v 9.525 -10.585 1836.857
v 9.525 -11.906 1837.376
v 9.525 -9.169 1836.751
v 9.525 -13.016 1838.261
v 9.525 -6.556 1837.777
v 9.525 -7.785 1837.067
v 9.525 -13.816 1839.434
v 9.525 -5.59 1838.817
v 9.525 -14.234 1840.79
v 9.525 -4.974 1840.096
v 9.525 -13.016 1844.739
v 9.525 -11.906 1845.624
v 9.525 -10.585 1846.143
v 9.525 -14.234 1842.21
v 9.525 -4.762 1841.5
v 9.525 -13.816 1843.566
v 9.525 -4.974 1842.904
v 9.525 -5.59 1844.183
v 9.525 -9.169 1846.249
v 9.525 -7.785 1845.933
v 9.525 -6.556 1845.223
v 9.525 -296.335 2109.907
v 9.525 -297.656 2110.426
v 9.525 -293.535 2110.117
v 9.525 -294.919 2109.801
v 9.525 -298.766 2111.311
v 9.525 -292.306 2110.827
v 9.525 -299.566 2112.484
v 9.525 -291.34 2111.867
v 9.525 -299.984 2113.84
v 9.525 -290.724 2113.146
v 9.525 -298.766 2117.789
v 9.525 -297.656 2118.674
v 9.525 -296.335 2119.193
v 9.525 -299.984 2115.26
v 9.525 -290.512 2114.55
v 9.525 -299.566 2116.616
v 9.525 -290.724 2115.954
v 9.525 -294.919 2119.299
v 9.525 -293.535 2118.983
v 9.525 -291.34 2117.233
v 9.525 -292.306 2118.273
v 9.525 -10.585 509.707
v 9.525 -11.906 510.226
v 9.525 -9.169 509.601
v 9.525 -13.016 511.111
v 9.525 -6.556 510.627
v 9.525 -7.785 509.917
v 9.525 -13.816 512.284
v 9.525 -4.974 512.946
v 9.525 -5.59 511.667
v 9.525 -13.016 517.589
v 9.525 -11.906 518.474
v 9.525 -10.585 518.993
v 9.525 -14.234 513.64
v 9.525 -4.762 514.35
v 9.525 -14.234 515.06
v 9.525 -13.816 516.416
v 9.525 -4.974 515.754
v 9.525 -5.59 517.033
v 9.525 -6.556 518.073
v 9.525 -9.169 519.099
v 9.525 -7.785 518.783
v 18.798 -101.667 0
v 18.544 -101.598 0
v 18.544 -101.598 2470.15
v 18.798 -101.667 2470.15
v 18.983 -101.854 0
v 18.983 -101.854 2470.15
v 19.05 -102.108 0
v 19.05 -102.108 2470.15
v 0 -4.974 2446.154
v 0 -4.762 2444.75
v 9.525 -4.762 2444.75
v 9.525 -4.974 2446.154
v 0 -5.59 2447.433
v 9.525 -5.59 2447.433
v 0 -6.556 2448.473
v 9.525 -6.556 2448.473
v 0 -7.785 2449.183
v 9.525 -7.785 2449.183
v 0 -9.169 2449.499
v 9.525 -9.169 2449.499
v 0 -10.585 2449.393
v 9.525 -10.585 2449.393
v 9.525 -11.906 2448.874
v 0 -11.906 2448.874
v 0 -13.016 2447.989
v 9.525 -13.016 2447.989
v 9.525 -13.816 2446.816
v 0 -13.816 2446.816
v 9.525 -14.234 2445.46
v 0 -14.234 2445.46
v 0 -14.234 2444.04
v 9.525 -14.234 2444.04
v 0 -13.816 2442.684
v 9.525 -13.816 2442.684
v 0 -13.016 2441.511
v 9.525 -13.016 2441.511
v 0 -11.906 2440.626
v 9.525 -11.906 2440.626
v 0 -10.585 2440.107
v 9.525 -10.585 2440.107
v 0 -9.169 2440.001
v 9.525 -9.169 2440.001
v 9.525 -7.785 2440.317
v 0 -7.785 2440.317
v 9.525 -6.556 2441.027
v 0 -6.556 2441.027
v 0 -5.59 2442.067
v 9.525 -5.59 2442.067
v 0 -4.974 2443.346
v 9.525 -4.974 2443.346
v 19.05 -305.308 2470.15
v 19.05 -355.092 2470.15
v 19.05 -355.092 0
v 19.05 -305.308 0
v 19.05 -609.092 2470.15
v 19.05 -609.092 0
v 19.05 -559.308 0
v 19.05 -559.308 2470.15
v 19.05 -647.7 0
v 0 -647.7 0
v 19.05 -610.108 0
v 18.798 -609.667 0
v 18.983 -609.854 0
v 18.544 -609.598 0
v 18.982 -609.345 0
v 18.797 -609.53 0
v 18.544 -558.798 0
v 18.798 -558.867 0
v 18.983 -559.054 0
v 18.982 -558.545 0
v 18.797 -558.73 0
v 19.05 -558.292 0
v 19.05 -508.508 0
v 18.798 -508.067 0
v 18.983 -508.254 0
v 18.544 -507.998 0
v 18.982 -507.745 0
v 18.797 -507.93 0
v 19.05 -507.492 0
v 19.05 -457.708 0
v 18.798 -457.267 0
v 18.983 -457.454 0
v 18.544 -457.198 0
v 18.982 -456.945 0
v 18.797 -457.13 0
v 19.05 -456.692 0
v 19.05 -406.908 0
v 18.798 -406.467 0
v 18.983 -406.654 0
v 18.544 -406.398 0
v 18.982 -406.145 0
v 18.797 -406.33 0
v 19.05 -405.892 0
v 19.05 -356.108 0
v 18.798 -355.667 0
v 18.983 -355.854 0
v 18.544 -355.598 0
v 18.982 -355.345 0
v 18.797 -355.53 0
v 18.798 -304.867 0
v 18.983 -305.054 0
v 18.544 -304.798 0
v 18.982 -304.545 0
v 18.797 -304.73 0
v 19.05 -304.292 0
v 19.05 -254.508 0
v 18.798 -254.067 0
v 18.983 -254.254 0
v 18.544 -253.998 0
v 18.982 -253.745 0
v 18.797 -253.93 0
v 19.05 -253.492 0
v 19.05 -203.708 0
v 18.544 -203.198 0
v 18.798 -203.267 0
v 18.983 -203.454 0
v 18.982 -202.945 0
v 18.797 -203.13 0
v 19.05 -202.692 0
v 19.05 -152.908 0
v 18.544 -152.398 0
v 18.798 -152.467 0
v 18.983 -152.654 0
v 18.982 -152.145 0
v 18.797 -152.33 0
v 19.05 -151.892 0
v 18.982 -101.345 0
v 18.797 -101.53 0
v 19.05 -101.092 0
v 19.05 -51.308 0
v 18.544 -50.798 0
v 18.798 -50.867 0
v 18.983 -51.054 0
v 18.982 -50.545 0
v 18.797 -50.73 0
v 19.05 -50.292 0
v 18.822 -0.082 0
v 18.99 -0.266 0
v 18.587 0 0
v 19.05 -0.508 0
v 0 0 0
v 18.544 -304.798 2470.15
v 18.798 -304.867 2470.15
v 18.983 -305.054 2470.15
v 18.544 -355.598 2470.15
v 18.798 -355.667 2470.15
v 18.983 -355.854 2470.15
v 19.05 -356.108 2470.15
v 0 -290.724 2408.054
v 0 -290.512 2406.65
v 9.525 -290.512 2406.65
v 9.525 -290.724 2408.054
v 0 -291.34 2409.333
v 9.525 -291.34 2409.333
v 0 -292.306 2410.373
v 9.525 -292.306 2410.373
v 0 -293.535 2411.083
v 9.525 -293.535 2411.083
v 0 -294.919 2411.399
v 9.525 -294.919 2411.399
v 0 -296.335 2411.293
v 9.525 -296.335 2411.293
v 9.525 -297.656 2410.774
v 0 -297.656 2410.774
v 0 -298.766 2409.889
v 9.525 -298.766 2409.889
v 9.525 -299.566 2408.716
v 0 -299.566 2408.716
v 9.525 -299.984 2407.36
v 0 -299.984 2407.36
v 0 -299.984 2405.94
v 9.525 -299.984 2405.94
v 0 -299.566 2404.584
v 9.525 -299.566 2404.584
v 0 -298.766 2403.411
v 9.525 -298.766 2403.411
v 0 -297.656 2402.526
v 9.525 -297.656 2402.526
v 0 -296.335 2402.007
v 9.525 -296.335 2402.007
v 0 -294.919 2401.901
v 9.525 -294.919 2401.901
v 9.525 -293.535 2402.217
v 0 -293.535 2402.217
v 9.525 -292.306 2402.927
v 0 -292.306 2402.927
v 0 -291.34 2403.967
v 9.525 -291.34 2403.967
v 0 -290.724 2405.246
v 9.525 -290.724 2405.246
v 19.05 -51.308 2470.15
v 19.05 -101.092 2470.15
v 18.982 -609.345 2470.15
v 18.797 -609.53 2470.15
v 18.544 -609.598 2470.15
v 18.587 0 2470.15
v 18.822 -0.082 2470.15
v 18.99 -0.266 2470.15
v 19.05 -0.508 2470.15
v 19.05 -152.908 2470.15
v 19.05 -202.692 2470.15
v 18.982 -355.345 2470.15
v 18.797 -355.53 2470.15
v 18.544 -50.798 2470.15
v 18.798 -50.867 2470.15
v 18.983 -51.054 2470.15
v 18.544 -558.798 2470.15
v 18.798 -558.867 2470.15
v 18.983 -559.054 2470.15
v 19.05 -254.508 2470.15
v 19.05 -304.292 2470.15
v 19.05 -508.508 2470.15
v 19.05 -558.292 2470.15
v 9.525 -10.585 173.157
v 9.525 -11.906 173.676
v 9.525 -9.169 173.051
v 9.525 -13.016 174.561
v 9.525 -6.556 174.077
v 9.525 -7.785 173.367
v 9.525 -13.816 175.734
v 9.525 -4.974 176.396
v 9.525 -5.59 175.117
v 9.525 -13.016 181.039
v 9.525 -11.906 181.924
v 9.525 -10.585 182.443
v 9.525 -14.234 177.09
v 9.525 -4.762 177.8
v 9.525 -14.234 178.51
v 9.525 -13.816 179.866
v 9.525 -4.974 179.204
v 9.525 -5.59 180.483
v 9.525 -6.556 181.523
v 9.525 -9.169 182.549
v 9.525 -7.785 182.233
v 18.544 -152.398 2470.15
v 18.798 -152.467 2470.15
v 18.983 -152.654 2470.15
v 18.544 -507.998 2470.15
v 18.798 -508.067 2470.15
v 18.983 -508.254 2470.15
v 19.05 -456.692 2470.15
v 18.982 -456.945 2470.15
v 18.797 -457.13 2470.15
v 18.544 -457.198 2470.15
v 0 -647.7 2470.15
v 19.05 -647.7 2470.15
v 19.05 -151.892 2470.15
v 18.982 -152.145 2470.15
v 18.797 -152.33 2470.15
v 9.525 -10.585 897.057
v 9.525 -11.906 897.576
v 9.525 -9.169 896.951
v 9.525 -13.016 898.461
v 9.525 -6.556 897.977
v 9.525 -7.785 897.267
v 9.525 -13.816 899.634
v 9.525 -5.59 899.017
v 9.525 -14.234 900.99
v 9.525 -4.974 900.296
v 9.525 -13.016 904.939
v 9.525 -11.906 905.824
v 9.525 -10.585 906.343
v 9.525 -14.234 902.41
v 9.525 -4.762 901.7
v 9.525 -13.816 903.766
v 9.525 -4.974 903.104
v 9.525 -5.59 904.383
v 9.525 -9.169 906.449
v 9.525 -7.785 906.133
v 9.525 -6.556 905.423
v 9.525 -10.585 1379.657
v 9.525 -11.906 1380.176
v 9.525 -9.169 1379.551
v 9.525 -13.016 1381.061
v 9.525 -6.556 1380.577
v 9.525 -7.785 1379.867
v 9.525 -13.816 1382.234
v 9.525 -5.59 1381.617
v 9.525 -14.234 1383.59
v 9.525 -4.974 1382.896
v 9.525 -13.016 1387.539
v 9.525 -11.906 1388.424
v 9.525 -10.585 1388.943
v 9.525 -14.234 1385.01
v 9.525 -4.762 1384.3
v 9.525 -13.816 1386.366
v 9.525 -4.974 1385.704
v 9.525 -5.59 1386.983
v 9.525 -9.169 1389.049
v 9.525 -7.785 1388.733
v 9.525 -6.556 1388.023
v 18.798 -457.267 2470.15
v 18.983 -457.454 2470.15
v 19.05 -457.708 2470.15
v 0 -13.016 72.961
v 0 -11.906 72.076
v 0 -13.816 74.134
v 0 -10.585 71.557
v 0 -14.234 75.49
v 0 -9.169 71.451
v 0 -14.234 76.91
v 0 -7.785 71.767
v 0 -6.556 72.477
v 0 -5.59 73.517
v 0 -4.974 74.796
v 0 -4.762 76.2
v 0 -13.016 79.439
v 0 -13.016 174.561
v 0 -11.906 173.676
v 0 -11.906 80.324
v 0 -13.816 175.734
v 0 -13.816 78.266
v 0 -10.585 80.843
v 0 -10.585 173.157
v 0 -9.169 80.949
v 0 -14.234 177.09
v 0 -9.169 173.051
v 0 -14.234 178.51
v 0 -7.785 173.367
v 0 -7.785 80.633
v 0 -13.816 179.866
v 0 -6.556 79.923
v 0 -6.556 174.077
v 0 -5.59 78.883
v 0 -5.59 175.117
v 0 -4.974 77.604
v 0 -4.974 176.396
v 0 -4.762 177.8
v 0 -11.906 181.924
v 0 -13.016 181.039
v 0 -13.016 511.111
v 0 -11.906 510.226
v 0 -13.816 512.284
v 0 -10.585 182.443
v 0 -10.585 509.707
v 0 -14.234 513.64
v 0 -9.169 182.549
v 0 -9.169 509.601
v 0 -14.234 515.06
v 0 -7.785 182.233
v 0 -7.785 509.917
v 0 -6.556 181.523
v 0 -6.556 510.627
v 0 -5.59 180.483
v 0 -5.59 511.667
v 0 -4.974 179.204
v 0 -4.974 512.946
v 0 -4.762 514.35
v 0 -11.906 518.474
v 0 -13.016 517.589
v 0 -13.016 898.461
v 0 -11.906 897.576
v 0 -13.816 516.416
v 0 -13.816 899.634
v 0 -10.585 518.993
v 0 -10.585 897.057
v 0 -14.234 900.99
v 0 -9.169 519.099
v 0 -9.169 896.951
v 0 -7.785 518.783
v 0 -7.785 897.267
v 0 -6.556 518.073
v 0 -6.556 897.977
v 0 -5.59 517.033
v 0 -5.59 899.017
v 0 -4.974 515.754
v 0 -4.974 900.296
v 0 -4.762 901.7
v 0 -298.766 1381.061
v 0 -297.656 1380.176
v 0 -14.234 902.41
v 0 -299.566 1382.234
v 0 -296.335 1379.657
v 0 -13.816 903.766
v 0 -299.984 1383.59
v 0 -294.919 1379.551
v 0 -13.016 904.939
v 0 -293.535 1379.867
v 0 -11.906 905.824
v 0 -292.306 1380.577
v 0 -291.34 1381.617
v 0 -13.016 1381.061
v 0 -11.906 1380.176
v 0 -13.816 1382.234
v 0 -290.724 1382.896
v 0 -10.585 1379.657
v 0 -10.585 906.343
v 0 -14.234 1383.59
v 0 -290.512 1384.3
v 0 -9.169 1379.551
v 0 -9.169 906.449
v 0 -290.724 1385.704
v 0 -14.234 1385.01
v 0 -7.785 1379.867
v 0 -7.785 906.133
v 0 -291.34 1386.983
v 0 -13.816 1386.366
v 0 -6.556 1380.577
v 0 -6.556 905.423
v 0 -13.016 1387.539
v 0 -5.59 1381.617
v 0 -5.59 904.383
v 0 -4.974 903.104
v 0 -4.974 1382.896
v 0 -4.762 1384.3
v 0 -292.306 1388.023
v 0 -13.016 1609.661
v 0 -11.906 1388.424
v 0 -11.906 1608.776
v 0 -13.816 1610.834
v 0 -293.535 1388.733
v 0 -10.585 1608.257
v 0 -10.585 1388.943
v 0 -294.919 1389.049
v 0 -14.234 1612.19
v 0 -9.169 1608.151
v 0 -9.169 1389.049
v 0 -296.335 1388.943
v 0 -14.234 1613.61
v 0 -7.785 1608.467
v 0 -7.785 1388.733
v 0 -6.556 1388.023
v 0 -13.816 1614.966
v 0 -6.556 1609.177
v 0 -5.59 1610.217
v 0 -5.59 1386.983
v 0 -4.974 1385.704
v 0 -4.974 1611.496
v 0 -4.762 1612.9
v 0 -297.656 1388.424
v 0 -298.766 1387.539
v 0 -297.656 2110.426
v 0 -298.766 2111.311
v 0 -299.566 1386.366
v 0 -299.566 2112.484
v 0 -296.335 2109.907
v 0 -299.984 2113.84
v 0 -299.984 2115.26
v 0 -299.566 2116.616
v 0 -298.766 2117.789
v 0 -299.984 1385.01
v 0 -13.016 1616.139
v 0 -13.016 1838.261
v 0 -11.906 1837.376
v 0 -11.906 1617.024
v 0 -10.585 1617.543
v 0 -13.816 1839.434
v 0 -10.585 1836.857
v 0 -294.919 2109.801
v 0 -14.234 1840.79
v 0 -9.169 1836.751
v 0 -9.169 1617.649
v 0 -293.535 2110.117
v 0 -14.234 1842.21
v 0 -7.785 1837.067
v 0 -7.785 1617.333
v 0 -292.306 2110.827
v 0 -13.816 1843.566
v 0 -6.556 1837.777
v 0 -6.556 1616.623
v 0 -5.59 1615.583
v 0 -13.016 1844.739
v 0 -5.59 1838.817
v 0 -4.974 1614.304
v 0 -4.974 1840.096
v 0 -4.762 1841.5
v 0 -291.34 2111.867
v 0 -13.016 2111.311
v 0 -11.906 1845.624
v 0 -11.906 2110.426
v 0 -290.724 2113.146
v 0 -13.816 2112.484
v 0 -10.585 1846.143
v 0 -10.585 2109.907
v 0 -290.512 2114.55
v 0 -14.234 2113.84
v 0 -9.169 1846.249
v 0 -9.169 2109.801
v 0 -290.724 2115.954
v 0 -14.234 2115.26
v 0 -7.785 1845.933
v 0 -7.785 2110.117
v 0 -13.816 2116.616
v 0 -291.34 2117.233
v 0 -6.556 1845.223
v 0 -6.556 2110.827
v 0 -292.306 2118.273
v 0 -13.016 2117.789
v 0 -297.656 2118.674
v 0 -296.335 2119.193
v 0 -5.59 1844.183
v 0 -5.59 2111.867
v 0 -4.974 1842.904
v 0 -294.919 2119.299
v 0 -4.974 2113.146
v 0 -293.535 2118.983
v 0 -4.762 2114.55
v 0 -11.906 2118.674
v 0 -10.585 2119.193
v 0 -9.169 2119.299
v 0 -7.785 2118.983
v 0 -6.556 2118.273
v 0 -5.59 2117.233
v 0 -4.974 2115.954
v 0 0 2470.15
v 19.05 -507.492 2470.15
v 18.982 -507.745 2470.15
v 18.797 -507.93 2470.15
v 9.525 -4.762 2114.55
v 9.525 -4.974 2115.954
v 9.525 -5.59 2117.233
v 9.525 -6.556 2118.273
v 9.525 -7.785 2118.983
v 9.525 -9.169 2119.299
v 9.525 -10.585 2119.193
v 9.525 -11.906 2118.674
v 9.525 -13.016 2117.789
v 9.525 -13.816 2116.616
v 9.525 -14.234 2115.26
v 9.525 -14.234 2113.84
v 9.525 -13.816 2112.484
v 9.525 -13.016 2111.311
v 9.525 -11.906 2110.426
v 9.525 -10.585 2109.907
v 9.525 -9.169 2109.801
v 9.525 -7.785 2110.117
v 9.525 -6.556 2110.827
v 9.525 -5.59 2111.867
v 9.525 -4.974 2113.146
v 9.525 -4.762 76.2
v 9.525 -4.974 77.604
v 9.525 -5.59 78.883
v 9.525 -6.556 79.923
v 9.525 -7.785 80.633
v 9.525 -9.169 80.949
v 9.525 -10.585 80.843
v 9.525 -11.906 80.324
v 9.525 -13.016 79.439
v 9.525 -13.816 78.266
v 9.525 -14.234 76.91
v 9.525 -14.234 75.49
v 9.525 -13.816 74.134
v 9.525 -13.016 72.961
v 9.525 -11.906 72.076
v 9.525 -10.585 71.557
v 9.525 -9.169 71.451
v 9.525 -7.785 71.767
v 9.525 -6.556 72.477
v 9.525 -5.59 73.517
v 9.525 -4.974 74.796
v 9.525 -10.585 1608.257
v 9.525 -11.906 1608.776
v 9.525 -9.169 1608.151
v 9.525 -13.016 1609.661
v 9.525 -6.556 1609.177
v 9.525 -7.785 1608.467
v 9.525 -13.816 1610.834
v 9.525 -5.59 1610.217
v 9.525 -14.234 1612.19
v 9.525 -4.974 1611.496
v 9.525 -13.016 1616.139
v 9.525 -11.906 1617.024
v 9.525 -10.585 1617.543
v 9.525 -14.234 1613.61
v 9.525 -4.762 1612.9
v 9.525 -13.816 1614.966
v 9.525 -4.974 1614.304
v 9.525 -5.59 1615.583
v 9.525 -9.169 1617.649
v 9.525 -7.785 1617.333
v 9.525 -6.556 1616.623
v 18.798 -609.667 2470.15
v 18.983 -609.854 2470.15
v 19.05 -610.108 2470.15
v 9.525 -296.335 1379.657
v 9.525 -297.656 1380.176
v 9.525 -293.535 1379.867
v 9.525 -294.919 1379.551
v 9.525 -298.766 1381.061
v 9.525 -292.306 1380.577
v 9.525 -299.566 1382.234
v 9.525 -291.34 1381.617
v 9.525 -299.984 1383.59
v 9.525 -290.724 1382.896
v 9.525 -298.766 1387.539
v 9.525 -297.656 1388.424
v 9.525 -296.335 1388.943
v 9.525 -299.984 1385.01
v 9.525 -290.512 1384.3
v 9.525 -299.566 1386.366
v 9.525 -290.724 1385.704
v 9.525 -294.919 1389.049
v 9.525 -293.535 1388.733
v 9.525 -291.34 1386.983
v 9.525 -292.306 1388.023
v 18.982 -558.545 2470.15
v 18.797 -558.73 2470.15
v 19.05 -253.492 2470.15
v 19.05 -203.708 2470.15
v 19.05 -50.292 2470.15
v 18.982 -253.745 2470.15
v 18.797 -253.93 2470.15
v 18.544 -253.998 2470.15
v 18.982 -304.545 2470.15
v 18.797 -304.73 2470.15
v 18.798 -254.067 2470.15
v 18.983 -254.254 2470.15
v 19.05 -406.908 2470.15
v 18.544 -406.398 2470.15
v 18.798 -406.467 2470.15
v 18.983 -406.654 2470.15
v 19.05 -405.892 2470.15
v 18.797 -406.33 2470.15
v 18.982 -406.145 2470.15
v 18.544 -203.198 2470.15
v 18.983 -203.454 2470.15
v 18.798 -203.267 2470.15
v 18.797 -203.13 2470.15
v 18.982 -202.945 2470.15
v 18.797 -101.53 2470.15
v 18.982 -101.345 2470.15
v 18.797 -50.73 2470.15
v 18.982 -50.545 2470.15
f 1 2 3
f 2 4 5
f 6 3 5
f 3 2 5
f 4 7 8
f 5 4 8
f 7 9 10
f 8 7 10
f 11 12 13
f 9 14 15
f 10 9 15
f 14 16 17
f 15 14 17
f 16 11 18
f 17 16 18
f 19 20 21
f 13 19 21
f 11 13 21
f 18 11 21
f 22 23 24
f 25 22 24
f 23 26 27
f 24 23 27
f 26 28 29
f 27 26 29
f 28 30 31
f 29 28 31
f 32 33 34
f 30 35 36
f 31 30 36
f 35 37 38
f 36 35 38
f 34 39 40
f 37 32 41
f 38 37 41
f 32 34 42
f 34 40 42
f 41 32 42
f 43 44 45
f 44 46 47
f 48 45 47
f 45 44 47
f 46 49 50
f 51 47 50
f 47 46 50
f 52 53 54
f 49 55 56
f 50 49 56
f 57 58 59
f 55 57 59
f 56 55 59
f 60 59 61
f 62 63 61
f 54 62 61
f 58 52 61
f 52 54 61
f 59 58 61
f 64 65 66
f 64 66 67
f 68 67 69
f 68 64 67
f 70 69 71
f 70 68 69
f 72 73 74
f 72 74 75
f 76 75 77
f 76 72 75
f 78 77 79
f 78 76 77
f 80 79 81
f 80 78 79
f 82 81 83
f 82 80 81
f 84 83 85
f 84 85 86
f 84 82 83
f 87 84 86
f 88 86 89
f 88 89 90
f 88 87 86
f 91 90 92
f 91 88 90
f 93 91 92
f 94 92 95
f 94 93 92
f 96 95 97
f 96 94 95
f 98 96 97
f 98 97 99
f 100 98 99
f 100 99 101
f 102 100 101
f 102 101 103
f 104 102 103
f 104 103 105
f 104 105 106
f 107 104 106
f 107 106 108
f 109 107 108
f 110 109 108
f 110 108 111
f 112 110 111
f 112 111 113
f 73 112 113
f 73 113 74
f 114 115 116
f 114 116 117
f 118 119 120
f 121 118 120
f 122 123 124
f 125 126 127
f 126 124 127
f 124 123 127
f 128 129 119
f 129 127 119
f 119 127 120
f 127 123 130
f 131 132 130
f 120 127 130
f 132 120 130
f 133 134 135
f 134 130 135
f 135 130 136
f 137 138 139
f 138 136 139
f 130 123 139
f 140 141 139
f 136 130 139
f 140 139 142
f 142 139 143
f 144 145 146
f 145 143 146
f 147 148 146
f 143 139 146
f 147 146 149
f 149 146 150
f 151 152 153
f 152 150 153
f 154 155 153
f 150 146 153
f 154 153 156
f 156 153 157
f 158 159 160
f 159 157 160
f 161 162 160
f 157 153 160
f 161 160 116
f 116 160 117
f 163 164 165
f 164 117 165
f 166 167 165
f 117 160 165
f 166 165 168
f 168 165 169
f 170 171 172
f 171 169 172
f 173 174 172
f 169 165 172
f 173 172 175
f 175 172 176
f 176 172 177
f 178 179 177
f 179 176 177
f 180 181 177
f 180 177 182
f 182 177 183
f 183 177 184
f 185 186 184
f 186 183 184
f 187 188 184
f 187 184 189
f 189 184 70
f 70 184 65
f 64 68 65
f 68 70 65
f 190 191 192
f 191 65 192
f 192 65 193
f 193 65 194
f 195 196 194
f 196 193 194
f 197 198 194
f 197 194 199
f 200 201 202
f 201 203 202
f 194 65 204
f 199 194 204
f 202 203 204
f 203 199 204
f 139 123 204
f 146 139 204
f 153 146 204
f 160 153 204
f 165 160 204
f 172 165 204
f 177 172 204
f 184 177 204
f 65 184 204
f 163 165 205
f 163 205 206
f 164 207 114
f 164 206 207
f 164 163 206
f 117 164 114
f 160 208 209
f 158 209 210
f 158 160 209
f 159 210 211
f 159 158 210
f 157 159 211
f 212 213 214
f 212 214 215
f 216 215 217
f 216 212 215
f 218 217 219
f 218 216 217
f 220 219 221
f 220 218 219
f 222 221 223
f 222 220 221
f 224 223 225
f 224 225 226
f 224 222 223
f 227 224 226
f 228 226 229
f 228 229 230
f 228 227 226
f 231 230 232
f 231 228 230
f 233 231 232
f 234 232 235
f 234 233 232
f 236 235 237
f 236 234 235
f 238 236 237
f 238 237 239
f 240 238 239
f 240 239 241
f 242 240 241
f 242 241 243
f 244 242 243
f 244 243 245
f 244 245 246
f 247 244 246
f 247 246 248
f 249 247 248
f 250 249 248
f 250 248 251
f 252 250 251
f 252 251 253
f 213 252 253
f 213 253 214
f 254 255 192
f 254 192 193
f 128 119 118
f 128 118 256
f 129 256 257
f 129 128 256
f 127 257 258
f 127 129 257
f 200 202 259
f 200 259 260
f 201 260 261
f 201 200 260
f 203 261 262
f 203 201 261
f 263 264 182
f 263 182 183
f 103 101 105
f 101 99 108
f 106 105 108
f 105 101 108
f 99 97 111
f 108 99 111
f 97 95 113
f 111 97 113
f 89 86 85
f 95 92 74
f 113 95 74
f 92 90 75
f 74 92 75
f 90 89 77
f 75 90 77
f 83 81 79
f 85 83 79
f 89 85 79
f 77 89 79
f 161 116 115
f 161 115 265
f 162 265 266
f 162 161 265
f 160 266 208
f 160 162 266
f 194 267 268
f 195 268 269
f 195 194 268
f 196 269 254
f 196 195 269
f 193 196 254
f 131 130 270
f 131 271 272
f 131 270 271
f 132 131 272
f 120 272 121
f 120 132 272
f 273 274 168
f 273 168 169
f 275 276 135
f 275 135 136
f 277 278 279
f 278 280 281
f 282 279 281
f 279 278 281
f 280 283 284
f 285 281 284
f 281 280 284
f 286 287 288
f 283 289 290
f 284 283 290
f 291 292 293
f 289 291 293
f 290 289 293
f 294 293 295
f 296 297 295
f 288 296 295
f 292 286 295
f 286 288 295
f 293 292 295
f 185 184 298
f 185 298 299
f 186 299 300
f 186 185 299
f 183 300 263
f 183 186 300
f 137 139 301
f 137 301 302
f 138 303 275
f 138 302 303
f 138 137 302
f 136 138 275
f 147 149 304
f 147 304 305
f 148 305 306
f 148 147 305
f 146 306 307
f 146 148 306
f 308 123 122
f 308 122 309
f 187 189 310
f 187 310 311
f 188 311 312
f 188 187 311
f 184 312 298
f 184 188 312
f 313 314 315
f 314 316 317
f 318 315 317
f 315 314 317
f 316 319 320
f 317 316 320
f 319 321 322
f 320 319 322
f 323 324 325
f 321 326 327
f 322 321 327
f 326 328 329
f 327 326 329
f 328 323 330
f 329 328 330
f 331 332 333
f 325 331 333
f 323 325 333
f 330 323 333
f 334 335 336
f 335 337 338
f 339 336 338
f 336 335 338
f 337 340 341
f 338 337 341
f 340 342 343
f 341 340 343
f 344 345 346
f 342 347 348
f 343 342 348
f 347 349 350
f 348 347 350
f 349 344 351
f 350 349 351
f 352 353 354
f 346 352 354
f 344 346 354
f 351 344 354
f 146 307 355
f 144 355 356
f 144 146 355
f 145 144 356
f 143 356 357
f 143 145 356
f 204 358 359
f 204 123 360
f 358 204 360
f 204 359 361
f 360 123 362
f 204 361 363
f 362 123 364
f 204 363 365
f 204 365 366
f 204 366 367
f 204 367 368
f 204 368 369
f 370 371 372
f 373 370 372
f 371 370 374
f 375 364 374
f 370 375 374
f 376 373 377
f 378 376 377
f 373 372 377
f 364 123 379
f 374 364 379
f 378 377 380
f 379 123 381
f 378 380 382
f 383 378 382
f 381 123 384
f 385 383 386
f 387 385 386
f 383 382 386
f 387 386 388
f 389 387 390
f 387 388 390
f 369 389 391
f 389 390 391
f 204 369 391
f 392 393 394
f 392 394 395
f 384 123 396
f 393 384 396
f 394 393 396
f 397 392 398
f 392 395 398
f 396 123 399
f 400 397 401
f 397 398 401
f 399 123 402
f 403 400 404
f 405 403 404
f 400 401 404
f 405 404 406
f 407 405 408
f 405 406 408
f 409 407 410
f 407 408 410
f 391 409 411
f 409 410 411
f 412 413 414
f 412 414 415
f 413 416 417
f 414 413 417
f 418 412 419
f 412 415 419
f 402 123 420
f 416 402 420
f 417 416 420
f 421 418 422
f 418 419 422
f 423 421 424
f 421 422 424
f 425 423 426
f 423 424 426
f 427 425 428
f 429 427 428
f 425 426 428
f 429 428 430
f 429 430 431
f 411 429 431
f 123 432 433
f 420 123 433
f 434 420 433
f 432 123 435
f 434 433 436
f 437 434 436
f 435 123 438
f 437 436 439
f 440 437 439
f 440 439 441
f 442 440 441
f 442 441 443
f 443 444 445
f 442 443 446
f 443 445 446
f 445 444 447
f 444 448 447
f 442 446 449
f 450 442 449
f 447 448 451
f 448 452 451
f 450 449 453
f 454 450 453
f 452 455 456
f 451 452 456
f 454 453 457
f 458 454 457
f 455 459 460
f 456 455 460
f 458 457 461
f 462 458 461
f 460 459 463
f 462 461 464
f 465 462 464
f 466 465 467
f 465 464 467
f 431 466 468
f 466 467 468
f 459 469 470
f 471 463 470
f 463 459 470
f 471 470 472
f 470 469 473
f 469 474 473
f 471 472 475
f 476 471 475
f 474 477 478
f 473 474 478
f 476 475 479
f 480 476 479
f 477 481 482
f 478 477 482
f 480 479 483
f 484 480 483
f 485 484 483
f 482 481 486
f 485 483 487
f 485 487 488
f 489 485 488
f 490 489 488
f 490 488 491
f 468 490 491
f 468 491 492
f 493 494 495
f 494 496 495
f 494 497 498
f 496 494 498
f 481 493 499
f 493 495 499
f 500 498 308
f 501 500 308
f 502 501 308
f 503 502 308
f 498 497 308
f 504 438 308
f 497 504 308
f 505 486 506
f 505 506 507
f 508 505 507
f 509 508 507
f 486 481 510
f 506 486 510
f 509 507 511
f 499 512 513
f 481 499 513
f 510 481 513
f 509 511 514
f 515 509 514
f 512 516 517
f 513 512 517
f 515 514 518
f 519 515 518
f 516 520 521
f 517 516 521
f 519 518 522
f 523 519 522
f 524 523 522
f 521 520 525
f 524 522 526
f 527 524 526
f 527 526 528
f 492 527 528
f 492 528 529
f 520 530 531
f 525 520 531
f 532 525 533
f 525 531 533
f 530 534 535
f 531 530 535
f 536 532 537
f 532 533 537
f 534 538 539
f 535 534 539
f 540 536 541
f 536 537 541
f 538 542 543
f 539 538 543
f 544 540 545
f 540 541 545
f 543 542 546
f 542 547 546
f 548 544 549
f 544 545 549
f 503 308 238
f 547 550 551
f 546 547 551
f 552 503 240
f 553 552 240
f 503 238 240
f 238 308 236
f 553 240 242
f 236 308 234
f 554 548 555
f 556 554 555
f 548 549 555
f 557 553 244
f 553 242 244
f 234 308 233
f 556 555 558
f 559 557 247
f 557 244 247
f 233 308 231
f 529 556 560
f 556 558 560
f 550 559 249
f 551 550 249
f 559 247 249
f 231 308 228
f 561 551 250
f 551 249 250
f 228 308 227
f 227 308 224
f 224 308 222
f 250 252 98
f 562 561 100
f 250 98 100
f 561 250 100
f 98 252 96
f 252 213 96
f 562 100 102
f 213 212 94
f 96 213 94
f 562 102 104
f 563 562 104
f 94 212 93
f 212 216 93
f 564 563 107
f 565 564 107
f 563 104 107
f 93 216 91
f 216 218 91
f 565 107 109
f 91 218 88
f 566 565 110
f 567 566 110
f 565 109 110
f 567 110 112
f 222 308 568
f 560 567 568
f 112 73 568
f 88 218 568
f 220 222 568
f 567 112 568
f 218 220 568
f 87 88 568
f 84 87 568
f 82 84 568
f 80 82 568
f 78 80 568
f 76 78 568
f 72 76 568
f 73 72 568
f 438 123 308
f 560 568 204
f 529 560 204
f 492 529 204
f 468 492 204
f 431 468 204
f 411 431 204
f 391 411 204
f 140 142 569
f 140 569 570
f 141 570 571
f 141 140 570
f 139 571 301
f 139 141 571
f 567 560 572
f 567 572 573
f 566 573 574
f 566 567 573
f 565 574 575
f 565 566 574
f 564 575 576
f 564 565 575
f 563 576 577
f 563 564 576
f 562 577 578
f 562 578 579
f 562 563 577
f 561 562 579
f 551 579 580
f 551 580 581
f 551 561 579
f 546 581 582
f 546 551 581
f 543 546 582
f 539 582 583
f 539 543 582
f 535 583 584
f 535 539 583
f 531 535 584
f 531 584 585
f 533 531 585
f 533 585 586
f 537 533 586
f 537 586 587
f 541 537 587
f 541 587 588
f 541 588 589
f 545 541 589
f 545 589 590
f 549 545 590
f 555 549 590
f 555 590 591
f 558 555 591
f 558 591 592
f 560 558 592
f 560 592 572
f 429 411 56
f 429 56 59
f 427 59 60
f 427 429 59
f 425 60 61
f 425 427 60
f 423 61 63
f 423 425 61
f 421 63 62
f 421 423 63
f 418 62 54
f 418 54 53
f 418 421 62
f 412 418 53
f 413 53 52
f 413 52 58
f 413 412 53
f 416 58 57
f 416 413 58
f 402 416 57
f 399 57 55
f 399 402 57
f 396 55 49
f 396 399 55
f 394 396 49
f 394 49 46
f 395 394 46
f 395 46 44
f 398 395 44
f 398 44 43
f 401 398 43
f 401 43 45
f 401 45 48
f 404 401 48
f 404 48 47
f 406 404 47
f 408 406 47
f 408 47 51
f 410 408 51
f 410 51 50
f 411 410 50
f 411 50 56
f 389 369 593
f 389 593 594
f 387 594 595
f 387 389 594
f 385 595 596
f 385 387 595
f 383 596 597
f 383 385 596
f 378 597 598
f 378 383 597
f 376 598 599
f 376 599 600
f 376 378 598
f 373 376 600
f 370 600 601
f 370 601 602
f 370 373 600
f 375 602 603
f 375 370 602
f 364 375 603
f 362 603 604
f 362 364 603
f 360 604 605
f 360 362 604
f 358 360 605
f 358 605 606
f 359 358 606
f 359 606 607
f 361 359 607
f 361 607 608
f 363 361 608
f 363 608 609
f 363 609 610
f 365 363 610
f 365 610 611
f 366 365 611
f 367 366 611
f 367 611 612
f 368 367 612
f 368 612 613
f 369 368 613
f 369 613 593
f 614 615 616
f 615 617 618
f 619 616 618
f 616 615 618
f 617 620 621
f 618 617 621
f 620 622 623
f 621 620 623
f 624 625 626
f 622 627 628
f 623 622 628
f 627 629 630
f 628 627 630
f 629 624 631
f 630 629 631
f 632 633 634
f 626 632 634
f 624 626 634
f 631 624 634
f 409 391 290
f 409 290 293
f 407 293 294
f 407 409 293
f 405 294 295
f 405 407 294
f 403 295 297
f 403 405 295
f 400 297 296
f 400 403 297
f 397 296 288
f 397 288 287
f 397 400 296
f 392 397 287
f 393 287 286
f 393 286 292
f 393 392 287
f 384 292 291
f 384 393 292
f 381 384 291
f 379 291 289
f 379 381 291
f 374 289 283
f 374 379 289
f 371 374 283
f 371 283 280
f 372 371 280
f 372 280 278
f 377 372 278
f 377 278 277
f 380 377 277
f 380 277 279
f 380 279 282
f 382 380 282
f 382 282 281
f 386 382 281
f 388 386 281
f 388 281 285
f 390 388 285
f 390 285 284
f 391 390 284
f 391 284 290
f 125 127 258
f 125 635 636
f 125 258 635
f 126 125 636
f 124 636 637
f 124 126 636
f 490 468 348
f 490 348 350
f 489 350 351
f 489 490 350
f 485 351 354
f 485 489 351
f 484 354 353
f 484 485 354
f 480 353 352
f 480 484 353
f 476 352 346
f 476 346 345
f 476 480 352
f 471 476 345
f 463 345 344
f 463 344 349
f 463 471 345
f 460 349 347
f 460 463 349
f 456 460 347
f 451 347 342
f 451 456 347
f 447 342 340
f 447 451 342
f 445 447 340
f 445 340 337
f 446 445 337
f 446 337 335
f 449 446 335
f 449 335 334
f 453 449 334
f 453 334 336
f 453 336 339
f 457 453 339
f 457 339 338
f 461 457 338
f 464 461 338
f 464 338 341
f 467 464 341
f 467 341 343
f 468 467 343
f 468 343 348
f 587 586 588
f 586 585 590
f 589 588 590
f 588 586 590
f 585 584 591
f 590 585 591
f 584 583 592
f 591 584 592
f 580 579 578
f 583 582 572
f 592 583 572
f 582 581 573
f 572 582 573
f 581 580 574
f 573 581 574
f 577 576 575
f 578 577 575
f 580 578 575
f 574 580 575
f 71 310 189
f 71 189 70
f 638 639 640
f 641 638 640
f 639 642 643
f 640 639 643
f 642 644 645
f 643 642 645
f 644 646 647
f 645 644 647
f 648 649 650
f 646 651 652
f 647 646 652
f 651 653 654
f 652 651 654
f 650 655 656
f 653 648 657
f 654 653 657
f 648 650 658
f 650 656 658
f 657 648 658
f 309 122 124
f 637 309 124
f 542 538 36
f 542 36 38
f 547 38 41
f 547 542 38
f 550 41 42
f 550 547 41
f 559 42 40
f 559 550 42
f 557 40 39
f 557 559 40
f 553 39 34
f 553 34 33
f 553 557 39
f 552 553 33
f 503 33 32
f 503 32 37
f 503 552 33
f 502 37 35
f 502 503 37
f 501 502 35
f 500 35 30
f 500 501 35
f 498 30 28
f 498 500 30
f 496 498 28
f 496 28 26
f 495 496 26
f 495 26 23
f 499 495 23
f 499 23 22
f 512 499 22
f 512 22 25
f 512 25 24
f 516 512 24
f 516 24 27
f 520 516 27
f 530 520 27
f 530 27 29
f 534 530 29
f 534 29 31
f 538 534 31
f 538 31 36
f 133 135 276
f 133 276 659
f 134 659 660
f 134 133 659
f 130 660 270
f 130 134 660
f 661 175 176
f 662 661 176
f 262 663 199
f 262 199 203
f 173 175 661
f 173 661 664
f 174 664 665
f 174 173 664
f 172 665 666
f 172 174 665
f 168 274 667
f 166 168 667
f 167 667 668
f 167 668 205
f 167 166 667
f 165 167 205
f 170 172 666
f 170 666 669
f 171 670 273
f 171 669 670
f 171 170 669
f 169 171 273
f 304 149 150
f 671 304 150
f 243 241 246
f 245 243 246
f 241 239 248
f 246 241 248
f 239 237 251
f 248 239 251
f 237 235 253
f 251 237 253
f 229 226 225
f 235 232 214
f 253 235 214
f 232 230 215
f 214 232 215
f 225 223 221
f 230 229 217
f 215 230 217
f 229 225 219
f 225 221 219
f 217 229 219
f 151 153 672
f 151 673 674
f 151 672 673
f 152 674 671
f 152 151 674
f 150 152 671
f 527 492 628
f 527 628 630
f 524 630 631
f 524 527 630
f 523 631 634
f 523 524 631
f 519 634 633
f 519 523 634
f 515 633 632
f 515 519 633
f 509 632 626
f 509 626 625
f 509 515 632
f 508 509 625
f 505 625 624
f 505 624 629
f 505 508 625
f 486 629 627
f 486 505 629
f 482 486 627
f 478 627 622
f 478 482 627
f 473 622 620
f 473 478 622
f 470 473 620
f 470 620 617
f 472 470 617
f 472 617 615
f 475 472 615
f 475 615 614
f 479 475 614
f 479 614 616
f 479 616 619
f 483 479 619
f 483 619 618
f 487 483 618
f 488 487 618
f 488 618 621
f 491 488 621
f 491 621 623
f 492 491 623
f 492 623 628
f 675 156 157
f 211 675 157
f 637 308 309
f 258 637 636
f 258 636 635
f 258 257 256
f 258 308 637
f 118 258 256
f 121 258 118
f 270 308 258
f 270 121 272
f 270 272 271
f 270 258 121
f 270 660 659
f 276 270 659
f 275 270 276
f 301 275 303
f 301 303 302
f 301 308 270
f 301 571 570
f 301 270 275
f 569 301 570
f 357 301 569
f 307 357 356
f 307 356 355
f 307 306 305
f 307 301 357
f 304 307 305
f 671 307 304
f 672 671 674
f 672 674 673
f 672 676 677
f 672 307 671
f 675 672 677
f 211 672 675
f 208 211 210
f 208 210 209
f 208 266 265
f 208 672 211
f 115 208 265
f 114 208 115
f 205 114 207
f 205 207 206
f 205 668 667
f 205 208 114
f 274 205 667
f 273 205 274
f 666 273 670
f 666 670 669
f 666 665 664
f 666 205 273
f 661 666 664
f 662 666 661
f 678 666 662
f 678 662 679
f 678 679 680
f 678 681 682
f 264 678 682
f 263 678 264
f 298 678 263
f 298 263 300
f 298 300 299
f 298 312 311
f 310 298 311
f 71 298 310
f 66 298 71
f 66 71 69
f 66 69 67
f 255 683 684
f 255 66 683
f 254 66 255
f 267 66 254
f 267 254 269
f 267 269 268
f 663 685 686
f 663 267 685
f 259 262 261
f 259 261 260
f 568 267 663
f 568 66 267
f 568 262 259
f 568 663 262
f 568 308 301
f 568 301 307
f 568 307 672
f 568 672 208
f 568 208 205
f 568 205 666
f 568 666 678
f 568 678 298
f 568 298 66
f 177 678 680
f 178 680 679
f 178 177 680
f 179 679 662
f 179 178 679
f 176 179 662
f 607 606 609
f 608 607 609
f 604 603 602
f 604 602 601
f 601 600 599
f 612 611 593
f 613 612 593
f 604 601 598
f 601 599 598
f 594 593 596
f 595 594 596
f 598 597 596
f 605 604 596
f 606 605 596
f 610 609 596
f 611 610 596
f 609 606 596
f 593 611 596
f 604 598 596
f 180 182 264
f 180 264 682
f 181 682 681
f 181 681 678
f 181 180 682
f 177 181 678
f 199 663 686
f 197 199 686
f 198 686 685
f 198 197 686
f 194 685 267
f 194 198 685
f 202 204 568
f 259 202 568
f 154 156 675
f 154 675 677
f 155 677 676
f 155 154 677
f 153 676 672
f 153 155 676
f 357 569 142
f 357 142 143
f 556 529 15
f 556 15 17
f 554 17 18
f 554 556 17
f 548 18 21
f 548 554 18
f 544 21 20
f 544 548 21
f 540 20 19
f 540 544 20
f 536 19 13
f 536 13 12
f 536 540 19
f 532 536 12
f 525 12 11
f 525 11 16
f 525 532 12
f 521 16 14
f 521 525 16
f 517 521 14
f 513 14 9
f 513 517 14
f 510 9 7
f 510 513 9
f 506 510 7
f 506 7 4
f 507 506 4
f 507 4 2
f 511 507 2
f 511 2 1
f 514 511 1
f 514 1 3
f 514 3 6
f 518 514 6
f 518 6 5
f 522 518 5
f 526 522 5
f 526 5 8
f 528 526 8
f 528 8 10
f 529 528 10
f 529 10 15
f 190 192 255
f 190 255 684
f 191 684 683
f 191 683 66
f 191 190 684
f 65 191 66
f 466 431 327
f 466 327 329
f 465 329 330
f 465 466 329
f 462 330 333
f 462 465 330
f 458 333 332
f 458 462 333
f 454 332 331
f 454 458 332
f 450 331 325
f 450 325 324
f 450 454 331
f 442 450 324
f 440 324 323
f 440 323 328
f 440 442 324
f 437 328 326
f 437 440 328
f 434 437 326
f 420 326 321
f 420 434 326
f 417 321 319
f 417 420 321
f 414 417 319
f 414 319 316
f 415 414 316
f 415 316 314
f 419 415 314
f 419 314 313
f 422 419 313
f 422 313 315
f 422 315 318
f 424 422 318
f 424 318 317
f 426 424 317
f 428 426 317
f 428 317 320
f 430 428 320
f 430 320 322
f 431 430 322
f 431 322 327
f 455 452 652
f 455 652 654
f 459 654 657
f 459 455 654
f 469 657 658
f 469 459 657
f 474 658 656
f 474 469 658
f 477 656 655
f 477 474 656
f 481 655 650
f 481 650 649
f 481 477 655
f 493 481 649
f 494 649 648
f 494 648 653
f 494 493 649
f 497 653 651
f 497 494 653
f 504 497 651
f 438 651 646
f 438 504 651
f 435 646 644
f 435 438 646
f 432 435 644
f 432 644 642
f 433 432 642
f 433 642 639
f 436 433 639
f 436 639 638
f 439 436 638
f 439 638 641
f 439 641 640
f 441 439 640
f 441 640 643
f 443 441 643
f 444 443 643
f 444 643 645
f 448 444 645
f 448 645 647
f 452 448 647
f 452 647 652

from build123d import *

# Parameters (mm, degrees)
F0_W     = 647.7
F0_H     = 2470.15
F1_DEPTH = 19.05
F3_R     = 4.7625
F4_DEPTH = 34.925
F6_DEPTH = 2540


# Not quite as in the source:
# - ends of sketch curves that miss each other by under 0.0002 mm in the source are joined


with BuildPart() as f1:
    # F0 (on Right) → F1 (new body)
    with BuildSketch(Plane.YZ):
        with Locations((-323.85, 1235.075)):
            Rectangle(F0_W, F0_H)
    extrude(amount=F1_DEPTH)

    # F3 (on offset) → F4 (cut)
    with BuildSketch(Plane.YZ.offset(-25.4)):
        with Locations((-9.525, 76.2)):
            Circle(F3_R)
        with Locations((-295.275, 1384.3)):
            Circle(F3_R)
        with Locations((-295.275, 2114.55)):
            Circle(F3_R)
        with Locations((-295.275, 2406.65)):
            Circle(F3_R)
        with Locations((-9.525, 2444.75)):
            Circle(F3_R)
        with Locations((-9.525, 2114.55)):
            Circle(F3_R)
        with Locations((-9.525, 1384.3)):
            Circle(F3_R)
        with Locations((-9.525, 901.7)):
            Circle(F3_R)
        with Locations((-9.525, 177.8)):
            Circle(F3_R)
        with Locations((-9.525, 514.35)):
            Circle(F3_R)
        with Locations((-9.525, 1612.9)):
            Circle(F3_R)
        with Locations((-9.525, 1841.5)):
            Circle(F3_R)
    extrude(amount=F4_DEPTH, mode=Mode.SUBTRACT)

    # F5 (on Top) → F6 (cut)
    with BuildSketch(Plane.XY):
        with BuildLine():
            ThreePointArc((18.5439819652, 50.8019742476), (18.9026076156, 50.6517855308), (19.0499961487, 50.292))
            ThreePointArc((19.0499961487, 50.292), (19.558, 50.8), (19.0499961487, 51.308))
            ThreePointArc((19.0499961487, 51.308), (18.9012115958, 50.95076922), (18.5439819652, 50.8019742476))
        make_face()
        with BuildLine():
            ThreePointArc((18.5439819652, 0.0019742476), (18.9026076156, -0.1482144692), (19.0499961487, -0.508))
            ThreePointArc((19.0499961487, -0.508), (19.558, 0), (19.0499961487, 0.508))
            ThreePointArc((19.0499961487, 0.508), (18.9012115958, 0.15076922), (18.5439819652, 0.0019742476))
        make_face()
        with BuildLine():
            ThreePointArc((18.5439819652, -50.7980257524), (18.9026076156, -50.9482144692), (19.0499961487, -51.308))
            ThreePointArc((19.0499961487, -51.308), (19.558, -50.8), (19.0499961487, -50.292))
            ThreePointArc((19.0499961487, -50.292), (18.9012115958, -50.64923078), (18.5439819652, -50.7980257524))
        make_face()
        with BuildLine():
            ThreePointArc((18.5439819652, -101.5980257524), (18.9026076156, -101.7482144692), (19.0499961487, -102.108))
            ThreePointArc((19.0499961487, -102.108), (19.558, -101.6), (19.0499961487, -101.092))
            ThreePointArc((19.0499961487, -101.092), (18.9012115958, -101.44923078), (18.5439819652, -101.5980257524))
        make_face()
        with BuildLine():
            ThreePointArc((18.5439819652, -152.3980257524), (18.9026076156, -152.5482144692), (19.0499961487, -152.908))
            ThreePointArc((19.0499961487, -152.908), (19.558, -152.4), (19.0499961487, -151.892))
            ThreePointArc((19.0499961487, -151.892), (18.9012115958, -152.24923078), (18.5439819652, -152.3980257524))
        make_face()
        with BuildLine():
            ThreePointArc((18.5439819652, -203.1980257524), (18.9026076156, -203.3482144692), (19.0499961487, -203.708))
            ThreePointArc((19.0499961487, -203.708), (19.558, -203.2), (19.0499961487, -202.692))
            ThreePointArc((19.0499961487, -202.692), (18.9012115958, -203.04923078), (18.5439819652, -203.1980257524))
        make_face()
        with BuildLine():
            ThreePointArc((18.5439819652, -253.9980257524), (18.9026076156, -254.1482144692), (19.0499961487, -254.508))
            ThreePointArc((19.0499961487, -254.508), (19.558, -254), (19.0499961487, -253.492))
            ThreePointArc((19.0499961487, -253.492), (18.9012115958, -253.84923078), (18.5439819652, -253.9980257524))
        make_face()
        with BuildLine():
            ThreePointArc((18.5439819652, -304.7980257524), (18.9026076156, -304.9482144692), (19.0499961487, -305.308))
            ThreePointArc((19.0499961487, -305.308), (19.558, -304.8), (19.0499961487, -304.292))
            ThreePointArc((19.0499961487, -304.292), (18.9012115958, -304.64923078), (18.5439819652, -304.7980257524))
        make_face()
        with BuildLine():
            ThreePointArc((18.5439819652, -355.5980257524), (18.9026076156, -355.7482144692), (19.0499961487, -356.108))
            ThreePointArc((19.0499961487, -356.108), (19.558, -355.6), (19.0499961487, -355.092))
            ThreePointArc((19.0499961487, -355.092), (18.9012115958, -355.44923078), (18.5439819652, -355.5980257524))
        make_face()
        with BuildLine():
            ThreePointArc((18.5439819652, -406.3980257524), (18.9026076156, -406.5482144692), (19.0499961487, -406.908))
            ThreePointArc((19.0499961487, -406.908), (19.558, -406.4), (19.0499961487, -405.892))
            ThreePointArc((19.0499961487, -405.892), (18.9012115958, -406.24923078), (18.5439819652, -406.3980257524))
        make_face()
        with BuildLine():
            ThreePointArc((18.5439819652, -457.1980257524), (18.9026076156, -457.3482144692), (19.0499961487, -457.708))
            ThreePointArc((19.0499961487, -457.708), (19.558, -457.2), (19.0499961487, -456.692))
            ThreePointArc((19.0499961487, -456.692), (18.9012115958, -457.04923078), (18.5439819652, -457.1980257524))
        make_face()
        with BuildLine():
            ThreePointArc((18.5439819652, -507.9980257524), (18.9026076156, -508.1482144692), (19.0499961487, -508.508))
            ThreePointArc((19.0499961487, -508.508), (19.558, -508), (19.0499961487, -507.492))
            ThreePointArc((19.0499961487, -507.492), (18.9012115958, -507.84923078), (18.5439819652, -507.9980257524))
        make_face()
        with BuildLine():
            ThreePointArc((18.5439819652, -558.7980257524), (18.9026076156, -558.9482144692), (19.0499961487, -559.308))
            ThreePointArc((19.0499961487, -559.308), (19.558, -558.8), (19.0499961487, -558.292))
            ThreePointArc((19.0499961487, -558.292), (18.9012115958, -558.64923078), (18.5439819652, -558.7980257524))
        make_face()
        with BuildLine():
            ThreePointArc((18.5439819652, -609.5980257524), (18.9026076156, -609.7482144692), (19.0499961487, -610.108))
            ThreePointArc((19.0499961487, -610.108), (19.558, -609.6), (19.0499961487, -609.092))
            ThreePointArc((19.0499961487, -609.092), (18.9012115958, -609.44923078), (18.5439819652, -609.5980257524))
        make_face()
        with BuildLine():
            ThreePointArc((18.5439819652, -660.3980257524), (18.9026076156, -660.5482144692), (19.0499961487, -660.908))
            ThreePointArc((19.0499961487, -660.908), (19.558, -660.4), (19.0499961487, -659.892))
            ThreePointArc((19.0499961487, -659.892), (18.9012115958, -660.24923078), (18.5439819652, -660.3980257524))
        make_face()
        with BuildLine():
            ThreePointArc((18.5439819652, -711.1980257524), (18.9026076156, -711.3482144692), (19.0499961487, -711.708))
            ThreePointArc((19.0499961487, -711.708), (19.558, -711.2), (19.0499961487, -710.692))
            ThreePointArc((19.0499961487, -710.692), (18.9012115958, -711.04923078), (18.5439819652, -711.1980257524))
        make_face()
    extrude(amount=F6_DEPTH, mode=Mode.SUBTRACT)


solid = f1.part
